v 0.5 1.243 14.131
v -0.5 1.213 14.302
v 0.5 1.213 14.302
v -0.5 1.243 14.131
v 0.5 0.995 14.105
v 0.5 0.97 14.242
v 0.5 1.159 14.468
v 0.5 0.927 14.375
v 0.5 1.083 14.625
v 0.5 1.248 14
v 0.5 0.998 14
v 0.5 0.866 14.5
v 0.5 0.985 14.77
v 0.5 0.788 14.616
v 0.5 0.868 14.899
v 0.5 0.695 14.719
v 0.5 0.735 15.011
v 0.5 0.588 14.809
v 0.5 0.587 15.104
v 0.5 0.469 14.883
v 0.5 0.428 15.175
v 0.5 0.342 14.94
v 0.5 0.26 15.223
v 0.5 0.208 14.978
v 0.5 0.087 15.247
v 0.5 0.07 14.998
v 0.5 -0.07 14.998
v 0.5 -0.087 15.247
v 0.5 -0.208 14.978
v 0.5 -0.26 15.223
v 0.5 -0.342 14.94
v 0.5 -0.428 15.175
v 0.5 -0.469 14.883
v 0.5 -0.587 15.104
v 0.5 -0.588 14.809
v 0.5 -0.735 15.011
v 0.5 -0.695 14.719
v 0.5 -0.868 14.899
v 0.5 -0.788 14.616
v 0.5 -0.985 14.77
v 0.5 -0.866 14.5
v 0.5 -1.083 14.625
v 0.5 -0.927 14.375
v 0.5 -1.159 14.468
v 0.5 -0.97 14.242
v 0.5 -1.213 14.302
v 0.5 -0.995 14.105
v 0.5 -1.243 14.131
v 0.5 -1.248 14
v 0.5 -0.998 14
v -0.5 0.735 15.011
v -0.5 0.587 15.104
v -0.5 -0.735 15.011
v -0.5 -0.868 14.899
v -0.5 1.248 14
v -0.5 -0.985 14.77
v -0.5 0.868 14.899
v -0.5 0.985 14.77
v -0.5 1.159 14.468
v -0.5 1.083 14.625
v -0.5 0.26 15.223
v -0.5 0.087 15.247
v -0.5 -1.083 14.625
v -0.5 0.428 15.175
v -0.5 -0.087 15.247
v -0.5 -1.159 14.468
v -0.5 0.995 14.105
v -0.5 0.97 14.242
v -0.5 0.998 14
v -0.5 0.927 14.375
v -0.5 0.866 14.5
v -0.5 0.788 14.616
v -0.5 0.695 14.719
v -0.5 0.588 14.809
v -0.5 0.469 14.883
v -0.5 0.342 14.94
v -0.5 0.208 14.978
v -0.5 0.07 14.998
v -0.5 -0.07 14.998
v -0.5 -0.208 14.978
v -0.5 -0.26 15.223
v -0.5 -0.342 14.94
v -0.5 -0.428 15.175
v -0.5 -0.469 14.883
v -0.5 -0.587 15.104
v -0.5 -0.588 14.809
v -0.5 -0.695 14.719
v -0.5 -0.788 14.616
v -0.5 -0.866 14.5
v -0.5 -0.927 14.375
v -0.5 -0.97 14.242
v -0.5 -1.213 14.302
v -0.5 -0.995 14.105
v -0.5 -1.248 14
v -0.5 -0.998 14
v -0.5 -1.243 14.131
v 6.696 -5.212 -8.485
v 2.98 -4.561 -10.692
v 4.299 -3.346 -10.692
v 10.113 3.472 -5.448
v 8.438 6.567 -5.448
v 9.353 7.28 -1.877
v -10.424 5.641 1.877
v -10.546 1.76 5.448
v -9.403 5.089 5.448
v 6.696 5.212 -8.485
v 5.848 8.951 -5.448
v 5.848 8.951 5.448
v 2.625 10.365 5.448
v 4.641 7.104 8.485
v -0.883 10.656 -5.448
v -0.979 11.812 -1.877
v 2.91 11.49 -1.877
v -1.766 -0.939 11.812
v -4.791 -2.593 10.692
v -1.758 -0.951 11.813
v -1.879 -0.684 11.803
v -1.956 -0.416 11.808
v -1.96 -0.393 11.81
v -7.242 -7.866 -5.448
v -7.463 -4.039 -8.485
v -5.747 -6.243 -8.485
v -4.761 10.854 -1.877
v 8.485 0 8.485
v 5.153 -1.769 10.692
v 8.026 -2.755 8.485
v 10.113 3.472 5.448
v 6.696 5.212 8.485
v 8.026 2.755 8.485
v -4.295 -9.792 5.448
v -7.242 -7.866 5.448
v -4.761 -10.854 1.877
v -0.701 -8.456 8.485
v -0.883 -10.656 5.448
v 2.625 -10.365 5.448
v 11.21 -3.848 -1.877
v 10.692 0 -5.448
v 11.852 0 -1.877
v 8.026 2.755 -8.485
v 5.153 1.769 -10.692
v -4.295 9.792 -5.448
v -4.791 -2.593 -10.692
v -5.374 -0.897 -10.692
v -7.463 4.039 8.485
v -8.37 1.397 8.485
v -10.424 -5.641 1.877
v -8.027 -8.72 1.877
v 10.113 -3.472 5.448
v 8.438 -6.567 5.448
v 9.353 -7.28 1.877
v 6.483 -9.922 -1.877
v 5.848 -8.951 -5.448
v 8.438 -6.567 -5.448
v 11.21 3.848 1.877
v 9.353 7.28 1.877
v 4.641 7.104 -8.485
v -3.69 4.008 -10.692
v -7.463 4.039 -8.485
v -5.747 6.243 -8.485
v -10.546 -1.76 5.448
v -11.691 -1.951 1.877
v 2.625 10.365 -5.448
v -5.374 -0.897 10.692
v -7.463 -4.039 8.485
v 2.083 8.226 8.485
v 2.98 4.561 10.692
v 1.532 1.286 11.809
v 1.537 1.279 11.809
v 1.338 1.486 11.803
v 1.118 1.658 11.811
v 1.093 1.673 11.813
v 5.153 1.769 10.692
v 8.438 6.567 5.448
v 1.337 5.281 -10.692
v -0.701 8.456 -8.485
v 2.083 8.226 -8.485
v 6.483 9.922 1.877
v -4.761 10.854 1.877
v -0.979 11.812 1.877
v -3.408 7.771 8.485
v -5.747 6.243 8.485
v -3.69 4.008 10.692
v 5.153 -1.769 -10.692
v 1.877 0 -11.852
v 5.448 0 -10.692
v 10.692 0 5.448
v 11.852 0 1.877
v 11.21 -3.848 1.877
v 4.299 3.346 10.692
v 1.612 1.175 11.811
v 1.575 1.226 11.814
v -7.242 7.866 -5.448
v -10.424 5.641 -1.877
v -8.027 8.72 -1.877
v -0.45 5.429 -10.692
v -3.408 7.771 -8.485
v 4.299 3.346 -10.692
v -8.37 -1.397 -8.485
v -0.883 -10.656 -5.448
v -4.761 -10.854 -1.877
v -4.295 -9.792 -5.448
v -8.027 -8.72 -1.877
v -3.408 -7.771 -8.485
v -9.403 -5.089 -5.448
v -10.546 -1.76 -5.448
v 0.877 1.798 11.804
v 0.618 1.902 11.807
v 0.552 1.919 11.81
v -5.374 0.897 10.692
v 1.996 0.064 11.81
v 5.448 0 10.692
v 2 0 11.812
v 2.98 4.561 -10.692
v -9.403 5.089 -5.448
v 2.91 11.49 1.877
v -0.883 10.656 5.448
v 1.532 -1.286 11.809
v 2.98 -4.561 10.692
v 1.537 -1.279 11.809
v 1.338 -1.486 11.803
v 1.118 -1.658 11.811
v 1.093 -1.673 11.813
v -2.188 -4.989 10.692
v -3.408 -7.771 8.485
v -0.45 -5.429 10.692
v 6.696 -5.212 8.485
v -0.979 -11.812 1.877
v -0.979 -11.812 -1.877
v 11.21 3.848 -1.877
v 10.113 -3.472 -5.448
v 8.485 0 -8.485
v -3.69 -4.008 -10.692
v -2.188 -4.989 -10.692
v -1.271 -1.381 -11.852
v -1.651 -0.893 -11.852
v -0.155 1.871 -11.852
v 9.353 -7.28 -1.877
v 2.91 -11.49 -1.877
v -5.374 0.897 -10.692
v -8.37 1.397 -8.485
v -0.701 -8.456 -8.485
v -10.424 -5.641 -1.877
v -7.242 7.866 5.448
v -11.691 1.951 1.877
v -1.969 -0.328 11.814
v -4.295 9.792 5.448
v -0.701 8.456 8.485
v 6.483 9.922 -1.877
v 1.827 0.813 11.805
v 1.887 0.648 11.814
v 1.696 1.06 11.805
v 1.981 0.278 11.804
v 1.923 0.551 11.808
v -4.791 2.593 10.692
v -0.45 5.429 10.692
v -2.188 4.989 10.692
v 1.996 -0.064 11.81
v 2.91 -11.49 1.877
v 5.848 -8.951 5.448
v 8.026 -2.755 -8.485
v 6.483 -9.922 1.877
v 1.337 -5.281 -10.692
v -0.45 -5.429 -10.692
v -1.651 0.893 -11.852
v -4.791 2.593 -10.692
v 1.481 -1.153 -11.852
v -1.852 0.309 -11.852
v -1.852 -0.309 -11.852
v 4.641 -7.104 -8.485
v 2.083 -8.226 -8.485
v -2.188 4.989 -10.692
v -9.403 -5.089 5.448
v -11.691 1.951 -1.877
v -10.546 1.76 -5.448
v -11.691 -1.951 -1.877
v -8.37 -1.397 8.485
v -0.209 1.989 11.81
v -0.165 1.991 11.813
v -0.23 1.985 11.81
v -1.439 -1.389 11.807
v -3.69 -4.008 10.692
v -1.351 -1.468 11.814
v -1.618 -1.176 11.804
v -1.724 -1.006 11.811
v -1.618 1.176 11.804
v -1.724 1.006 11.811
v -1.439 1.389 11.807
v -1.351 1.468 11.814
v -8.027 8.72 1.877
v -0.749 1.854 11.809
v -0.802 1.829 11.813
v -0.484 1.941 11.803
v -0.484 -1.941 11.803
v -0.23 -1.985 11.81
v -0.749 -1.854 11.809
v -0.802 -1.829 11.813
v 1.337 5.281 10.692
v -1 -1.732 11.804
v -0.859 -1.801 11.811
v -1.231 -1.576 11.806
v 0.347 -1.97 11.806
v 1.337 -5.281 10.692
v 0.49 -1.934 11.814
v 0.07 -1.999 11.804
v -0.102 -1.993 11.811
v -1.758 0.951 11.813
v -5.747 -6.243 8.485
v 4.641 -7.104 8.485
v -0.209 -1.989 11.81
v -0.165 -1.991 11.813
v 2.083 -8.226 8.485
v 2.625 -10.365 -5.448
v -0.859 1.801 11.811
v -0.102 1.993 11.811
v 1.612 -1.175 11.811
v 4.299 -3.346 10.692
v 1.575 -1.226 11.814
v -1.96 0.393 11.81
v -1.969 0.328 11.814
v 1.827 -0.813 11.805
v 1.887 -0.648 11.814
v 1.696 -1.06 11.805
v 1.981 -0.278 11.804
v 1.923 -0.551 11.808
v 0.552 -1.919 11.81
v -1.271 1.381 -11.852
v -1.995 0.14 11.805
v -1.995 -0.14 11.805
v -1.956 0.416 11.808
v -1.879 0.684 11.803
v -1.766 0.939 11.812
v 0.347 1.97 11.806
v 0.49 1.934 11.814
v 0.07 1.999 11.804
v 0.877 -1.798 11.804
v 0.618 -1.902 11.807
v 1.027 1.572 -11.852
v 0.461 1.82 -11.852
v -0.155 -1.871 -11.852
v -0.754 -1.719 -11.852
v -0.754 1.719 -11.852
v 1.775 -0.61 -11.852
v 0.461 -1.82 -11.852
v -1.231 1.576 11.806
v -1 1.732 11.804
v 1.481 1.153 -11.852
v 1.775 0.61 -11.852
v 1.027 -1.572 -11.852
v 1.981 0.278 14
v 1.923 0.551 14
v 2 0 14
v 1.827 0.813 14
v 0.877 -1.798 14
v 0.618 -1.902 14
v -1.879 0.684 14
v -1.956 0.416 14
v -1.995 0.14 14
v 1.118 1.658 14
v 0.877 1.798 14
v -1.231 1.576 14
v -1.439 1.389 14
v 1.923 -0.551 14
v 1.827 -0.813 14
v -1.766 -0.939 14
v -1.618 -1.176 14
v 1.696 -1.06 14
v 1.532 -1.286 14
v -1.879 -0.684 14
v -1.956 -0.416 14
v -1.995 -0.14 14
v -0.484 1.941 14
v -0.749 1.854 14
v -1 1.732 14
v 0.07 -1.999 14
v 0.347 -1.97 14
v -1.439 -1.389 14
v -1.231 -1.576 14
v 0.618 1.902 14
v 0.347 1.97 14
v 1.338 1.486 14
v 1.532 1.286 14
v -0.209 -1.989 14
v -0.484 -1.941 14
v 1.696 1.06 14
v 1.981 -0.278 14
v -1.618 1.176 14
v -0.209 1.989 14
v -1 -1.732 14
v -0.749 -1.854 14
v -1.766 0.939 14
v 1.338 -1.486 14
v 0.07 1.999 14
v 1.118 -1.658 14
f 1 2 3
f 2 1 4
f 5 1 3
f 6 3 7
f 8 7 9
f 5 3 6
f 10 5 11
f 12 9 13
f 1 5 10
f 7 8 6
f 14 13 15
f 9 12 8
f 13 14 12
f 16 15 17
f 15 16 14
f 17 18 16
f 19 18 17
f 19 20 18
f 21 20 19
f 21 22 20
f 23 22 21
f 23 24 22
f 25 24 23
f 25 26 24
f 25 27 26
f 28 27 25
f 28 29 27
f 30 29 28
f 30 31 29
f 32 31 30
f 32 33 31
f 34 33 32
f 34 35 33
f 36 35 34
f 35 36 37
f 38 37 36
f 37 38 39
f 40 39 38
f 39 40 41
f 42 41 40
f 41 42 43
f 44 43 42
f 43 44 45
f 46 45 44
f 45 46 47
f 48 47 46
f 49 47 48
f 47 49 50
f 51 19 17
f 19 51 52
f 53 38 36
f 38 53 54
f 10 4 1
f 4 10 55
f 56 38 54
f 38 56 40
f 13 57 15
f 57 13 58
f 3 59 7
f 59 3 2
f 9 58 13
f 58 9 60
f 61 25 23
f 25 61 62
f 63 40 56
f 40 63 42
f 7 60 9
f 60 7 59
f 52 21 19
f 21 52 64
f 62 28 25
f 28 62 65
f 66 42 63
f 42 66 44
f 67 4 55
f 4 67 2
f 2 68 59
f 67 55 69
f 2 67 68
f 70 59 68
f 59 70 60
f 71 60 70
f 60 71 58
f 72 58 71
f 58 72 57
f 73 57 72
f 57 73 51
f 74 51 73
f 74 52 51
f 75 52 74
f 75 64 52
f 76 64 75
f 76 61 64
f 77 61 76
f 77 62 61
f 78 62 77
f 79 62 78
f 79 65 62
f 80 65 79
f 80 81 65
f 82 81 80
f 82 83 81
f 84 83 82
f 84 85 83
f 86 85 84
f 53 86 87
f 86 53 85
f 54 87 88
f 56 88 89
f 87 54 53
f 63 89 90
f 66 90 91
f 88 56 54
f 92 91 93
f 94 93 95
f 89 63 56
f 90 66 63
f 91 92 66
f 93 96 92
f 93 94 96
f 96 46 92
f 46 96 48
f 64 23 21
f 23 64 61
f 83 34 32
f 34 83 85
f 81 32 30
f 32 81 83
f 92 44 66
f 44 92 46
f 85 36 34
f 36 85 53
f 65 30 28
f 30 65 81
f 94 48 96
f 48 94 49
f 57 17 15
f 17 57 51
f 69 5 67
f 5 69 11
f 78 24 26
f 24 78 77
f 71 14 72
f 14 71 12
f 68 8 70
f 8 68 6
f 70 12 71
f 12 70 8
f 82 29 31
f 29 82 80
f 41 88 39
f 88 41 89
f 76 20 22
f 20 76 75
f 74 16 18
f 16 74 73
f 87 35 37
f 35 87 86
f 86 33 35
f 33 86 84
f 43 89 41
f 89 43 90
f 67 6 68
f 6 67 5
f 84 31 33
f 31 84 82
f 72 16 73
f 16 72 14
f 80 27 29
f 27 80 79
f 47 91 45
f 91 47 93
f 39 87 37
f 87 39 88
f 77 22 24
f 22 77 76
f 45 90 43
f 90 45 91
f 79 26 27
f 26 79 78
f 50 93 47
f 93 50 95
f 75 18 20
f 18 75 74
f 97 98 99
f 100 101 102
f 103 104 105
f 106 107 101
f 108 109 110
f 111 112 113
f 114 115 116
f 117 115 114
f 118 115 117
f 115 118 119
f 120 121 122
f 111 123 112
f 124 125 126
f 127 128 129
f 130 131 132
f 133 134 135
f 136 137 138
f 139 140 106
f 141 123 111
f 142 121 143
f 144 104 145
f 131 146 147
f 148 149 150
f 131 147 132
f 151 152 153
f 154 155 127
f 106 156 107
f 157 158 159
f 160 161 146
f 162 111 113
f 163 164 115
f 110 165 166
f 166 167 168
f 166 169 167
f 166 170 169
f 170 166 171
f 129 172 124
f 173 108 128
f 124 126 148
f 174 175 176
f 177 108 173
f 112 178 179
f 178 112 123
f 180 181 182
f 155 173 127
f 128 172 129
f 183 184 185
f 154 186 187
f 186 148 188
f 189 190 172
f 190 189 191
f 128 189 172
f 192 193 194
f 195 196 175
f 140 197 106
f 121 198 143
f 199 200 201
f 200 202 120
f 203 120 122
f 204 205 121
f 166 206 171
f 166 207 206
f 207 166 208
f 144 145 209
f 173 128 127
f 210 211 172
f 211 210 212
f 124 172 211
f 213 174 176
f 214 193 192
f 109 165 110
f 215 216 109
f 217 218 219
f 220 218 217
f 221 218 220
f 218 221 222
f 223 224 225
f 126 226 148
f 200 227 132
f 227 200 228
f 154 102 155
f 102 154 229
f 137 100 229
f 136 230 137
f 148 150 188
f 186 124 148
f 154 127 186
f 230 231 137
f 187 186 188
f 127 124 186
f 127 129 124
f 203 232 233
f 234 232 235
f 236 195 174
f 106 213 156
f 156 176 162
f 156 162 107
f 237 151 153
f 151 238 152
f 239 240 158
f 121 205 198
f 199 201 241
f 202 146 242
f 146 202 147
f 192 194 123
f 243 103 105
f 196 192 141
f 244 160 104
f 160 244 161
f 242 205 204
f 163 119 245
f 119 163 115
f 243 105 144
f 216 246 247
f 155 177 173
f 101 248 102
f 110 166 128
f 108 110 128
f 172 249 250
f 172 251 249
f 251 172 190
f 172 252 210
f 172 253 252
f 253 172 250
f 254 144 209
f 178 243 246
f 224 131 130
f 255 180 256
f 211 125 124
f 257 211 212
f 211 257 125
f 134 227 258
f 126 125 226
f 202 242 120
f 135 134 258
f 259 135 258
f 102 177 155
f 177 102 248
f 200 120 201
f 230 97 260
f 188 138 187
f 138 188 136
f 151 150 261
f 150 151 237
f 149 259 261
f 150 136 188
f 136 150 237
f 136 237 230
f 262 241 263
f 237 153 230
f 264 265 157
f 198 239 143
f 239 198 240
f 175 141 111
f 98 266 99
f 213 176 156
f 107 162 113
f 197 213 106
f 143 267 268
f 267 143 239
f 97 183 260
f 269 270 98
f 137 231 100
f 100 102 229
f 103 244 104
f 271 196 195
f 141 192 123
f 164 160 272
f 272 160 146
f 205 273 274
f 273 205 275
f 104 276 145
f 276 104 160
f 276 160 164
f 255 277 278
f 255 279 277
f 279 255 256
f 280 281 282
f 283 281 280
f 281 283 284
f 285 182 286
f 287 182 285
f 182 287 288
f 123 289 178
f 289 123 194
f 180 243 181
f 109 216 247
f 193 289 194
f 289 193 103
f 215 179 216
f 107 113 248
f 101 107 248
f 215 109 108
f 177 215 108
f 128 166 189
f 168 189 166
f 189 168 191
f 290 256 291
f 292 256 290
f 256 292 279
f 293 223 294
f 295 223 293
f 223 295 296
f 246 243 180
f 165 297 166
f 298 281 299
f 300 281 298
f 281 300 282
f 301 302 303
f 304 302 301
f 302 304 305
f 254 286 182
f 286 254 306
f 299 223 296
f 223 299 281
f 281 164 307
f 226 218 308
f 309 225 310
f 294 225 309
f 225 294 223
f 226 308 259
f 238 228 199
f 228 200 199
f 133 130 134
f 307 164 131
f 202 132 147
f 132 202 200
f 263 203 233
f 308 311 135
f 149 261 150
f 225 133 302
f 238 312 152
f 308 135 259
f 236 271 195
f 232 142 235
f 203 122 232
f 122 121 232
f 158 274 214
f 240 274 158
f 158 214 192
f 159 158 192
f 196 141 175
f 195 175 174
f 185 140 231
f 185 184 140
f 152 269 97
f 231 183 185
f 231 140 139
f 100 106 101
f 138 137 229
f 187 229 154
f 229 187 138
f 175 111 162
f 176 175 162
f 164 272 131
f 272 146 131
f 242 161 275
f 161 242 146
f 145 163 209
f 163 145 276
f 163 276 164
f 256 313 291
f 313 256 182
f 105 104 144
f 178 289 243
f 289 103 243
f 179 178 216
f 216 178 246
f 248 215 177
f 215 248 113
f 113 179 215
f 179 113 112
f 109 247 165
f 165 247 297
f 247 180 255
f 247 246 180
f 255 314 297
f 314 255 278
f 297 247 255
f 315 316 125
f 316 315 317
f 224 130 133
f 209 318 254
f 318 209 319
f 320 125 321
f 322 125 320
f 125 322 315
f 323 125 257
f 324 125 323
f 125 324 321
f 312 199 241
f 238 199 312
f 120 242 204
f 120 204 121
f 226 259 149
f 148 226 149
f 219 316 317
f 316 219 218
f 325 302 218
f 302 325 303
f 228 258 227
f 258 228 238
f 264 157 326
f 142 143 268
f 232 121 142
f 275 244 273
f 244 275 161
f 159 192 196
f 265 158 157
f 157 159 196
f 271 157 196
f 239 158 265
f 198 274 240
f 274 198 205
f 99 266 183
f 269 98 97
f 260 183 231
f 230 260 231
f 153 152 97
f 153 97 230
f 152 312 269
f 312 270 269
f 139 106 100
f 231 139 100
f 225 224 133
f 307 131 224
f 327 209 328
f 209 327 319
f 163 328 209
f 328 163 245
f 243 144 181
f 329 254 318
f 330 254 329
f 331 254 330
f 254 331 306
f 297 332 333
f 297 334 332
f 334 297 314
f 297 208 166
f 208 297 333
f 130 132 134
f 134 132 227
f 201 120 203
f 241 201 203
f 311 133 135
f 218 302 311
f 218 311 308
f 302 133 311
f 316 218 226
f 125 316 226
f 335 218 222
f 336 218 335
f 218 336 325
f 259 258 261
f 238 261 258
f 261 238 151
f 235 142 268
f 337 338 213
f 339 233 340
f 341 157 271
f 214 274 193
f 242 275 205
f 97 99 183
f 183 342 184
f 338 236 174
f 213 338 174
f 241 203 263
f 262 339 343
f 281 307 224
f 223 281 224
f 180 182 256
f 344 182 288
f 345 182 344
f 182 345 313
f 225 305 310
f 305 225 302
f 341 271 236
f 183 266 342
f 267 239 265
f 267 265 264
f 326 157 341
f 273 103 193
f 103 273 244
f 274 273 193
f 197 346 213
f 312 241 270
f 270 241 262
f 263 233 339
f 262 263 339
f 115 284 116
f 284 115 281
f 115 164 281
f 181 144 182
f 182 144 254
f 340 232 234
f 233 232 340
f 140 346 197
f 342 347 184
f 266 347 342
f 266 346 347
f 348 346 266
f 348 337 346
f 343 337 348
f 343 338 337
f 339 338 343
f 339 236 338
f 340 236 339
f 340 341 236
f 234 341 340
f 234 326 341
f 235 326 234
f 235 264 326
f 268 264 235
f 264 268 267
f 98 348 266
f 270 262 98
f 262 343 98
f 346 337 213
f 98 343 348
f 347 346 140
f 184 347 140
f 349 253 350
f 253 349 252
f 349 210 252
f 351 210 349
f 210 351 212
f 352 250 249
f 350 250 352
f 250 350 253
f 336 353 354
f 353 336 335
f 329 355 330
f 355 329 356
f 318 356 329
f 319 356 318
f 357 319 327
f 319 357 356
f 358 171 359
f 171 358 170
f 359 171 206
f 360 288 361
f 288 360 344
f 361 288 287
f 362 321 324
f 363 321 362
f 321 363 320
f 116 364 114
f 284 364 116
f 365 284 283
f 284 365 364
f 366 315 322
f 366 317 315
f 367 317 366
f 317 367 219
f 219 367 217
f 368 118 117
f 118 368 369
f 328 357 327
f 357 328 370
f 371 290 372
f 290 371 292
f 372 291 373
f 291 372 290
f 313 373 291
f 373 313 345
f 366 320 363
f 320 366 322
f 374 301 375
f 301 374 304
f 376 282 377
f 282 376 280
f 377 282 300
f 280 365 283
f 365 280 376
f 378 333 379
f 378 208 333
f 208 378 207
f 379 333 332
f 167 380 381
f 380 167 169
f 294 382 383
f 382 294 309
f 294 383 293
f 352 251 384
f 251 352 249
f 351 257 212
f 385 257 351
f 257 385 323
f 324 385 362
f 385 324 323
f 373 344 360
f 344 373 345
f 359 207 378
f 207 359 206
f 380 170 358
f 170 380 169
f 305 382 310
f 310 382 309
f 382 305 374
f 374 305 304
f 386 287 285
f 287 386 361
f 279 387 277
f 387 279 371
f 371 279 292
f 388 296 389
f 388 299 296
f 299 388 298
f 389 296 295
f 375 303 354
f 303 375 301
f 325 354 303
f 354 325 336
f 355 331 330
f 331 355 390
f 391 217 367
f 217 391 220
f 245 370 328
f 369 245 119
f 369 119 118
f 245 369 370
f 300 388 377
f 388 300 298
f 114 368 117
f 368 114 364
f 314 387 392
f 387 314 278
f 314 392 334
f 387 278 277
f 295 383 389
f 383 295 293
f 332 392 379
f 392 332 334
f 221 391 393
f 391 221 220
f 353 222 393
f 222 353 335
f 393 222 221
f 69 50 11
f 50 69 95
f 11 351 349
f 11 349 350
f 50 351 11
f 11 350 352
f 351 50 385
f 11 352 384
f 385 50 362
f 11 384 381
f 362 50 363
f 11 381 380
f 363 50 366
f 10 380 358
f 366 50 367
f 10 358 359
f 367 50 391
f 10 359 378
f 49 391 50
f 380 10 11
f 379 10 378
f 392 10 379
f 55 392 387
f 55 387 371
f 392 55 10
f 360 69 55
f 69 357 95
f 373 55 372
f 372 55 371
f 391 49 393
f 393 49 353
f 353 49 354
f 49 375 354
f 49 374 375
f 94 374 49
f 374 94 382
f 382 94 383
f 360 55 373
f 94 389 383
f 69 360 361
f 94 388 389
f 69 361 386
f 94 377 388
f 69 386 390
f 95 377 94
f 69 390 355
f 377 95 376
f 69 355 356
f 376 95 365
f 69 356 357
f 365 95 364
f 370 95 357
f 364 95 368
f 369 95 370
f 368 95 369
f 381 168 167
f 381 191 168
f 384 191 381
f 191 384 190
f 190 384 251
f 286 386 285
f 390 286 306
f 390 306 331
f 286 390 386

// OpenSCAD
scale(2) {
    sphere(6);
    translate([0,0,5]) {
        cylinder(2, $fn=45);
    }
    translate([0,0,7])
    rotate([0,90])
    difference() {
        cylinder(h=0.5, d=1.25,
        $fn=45, center=true);
        cylinder(d=1, $fn=45,
        center=true);
    }
}
